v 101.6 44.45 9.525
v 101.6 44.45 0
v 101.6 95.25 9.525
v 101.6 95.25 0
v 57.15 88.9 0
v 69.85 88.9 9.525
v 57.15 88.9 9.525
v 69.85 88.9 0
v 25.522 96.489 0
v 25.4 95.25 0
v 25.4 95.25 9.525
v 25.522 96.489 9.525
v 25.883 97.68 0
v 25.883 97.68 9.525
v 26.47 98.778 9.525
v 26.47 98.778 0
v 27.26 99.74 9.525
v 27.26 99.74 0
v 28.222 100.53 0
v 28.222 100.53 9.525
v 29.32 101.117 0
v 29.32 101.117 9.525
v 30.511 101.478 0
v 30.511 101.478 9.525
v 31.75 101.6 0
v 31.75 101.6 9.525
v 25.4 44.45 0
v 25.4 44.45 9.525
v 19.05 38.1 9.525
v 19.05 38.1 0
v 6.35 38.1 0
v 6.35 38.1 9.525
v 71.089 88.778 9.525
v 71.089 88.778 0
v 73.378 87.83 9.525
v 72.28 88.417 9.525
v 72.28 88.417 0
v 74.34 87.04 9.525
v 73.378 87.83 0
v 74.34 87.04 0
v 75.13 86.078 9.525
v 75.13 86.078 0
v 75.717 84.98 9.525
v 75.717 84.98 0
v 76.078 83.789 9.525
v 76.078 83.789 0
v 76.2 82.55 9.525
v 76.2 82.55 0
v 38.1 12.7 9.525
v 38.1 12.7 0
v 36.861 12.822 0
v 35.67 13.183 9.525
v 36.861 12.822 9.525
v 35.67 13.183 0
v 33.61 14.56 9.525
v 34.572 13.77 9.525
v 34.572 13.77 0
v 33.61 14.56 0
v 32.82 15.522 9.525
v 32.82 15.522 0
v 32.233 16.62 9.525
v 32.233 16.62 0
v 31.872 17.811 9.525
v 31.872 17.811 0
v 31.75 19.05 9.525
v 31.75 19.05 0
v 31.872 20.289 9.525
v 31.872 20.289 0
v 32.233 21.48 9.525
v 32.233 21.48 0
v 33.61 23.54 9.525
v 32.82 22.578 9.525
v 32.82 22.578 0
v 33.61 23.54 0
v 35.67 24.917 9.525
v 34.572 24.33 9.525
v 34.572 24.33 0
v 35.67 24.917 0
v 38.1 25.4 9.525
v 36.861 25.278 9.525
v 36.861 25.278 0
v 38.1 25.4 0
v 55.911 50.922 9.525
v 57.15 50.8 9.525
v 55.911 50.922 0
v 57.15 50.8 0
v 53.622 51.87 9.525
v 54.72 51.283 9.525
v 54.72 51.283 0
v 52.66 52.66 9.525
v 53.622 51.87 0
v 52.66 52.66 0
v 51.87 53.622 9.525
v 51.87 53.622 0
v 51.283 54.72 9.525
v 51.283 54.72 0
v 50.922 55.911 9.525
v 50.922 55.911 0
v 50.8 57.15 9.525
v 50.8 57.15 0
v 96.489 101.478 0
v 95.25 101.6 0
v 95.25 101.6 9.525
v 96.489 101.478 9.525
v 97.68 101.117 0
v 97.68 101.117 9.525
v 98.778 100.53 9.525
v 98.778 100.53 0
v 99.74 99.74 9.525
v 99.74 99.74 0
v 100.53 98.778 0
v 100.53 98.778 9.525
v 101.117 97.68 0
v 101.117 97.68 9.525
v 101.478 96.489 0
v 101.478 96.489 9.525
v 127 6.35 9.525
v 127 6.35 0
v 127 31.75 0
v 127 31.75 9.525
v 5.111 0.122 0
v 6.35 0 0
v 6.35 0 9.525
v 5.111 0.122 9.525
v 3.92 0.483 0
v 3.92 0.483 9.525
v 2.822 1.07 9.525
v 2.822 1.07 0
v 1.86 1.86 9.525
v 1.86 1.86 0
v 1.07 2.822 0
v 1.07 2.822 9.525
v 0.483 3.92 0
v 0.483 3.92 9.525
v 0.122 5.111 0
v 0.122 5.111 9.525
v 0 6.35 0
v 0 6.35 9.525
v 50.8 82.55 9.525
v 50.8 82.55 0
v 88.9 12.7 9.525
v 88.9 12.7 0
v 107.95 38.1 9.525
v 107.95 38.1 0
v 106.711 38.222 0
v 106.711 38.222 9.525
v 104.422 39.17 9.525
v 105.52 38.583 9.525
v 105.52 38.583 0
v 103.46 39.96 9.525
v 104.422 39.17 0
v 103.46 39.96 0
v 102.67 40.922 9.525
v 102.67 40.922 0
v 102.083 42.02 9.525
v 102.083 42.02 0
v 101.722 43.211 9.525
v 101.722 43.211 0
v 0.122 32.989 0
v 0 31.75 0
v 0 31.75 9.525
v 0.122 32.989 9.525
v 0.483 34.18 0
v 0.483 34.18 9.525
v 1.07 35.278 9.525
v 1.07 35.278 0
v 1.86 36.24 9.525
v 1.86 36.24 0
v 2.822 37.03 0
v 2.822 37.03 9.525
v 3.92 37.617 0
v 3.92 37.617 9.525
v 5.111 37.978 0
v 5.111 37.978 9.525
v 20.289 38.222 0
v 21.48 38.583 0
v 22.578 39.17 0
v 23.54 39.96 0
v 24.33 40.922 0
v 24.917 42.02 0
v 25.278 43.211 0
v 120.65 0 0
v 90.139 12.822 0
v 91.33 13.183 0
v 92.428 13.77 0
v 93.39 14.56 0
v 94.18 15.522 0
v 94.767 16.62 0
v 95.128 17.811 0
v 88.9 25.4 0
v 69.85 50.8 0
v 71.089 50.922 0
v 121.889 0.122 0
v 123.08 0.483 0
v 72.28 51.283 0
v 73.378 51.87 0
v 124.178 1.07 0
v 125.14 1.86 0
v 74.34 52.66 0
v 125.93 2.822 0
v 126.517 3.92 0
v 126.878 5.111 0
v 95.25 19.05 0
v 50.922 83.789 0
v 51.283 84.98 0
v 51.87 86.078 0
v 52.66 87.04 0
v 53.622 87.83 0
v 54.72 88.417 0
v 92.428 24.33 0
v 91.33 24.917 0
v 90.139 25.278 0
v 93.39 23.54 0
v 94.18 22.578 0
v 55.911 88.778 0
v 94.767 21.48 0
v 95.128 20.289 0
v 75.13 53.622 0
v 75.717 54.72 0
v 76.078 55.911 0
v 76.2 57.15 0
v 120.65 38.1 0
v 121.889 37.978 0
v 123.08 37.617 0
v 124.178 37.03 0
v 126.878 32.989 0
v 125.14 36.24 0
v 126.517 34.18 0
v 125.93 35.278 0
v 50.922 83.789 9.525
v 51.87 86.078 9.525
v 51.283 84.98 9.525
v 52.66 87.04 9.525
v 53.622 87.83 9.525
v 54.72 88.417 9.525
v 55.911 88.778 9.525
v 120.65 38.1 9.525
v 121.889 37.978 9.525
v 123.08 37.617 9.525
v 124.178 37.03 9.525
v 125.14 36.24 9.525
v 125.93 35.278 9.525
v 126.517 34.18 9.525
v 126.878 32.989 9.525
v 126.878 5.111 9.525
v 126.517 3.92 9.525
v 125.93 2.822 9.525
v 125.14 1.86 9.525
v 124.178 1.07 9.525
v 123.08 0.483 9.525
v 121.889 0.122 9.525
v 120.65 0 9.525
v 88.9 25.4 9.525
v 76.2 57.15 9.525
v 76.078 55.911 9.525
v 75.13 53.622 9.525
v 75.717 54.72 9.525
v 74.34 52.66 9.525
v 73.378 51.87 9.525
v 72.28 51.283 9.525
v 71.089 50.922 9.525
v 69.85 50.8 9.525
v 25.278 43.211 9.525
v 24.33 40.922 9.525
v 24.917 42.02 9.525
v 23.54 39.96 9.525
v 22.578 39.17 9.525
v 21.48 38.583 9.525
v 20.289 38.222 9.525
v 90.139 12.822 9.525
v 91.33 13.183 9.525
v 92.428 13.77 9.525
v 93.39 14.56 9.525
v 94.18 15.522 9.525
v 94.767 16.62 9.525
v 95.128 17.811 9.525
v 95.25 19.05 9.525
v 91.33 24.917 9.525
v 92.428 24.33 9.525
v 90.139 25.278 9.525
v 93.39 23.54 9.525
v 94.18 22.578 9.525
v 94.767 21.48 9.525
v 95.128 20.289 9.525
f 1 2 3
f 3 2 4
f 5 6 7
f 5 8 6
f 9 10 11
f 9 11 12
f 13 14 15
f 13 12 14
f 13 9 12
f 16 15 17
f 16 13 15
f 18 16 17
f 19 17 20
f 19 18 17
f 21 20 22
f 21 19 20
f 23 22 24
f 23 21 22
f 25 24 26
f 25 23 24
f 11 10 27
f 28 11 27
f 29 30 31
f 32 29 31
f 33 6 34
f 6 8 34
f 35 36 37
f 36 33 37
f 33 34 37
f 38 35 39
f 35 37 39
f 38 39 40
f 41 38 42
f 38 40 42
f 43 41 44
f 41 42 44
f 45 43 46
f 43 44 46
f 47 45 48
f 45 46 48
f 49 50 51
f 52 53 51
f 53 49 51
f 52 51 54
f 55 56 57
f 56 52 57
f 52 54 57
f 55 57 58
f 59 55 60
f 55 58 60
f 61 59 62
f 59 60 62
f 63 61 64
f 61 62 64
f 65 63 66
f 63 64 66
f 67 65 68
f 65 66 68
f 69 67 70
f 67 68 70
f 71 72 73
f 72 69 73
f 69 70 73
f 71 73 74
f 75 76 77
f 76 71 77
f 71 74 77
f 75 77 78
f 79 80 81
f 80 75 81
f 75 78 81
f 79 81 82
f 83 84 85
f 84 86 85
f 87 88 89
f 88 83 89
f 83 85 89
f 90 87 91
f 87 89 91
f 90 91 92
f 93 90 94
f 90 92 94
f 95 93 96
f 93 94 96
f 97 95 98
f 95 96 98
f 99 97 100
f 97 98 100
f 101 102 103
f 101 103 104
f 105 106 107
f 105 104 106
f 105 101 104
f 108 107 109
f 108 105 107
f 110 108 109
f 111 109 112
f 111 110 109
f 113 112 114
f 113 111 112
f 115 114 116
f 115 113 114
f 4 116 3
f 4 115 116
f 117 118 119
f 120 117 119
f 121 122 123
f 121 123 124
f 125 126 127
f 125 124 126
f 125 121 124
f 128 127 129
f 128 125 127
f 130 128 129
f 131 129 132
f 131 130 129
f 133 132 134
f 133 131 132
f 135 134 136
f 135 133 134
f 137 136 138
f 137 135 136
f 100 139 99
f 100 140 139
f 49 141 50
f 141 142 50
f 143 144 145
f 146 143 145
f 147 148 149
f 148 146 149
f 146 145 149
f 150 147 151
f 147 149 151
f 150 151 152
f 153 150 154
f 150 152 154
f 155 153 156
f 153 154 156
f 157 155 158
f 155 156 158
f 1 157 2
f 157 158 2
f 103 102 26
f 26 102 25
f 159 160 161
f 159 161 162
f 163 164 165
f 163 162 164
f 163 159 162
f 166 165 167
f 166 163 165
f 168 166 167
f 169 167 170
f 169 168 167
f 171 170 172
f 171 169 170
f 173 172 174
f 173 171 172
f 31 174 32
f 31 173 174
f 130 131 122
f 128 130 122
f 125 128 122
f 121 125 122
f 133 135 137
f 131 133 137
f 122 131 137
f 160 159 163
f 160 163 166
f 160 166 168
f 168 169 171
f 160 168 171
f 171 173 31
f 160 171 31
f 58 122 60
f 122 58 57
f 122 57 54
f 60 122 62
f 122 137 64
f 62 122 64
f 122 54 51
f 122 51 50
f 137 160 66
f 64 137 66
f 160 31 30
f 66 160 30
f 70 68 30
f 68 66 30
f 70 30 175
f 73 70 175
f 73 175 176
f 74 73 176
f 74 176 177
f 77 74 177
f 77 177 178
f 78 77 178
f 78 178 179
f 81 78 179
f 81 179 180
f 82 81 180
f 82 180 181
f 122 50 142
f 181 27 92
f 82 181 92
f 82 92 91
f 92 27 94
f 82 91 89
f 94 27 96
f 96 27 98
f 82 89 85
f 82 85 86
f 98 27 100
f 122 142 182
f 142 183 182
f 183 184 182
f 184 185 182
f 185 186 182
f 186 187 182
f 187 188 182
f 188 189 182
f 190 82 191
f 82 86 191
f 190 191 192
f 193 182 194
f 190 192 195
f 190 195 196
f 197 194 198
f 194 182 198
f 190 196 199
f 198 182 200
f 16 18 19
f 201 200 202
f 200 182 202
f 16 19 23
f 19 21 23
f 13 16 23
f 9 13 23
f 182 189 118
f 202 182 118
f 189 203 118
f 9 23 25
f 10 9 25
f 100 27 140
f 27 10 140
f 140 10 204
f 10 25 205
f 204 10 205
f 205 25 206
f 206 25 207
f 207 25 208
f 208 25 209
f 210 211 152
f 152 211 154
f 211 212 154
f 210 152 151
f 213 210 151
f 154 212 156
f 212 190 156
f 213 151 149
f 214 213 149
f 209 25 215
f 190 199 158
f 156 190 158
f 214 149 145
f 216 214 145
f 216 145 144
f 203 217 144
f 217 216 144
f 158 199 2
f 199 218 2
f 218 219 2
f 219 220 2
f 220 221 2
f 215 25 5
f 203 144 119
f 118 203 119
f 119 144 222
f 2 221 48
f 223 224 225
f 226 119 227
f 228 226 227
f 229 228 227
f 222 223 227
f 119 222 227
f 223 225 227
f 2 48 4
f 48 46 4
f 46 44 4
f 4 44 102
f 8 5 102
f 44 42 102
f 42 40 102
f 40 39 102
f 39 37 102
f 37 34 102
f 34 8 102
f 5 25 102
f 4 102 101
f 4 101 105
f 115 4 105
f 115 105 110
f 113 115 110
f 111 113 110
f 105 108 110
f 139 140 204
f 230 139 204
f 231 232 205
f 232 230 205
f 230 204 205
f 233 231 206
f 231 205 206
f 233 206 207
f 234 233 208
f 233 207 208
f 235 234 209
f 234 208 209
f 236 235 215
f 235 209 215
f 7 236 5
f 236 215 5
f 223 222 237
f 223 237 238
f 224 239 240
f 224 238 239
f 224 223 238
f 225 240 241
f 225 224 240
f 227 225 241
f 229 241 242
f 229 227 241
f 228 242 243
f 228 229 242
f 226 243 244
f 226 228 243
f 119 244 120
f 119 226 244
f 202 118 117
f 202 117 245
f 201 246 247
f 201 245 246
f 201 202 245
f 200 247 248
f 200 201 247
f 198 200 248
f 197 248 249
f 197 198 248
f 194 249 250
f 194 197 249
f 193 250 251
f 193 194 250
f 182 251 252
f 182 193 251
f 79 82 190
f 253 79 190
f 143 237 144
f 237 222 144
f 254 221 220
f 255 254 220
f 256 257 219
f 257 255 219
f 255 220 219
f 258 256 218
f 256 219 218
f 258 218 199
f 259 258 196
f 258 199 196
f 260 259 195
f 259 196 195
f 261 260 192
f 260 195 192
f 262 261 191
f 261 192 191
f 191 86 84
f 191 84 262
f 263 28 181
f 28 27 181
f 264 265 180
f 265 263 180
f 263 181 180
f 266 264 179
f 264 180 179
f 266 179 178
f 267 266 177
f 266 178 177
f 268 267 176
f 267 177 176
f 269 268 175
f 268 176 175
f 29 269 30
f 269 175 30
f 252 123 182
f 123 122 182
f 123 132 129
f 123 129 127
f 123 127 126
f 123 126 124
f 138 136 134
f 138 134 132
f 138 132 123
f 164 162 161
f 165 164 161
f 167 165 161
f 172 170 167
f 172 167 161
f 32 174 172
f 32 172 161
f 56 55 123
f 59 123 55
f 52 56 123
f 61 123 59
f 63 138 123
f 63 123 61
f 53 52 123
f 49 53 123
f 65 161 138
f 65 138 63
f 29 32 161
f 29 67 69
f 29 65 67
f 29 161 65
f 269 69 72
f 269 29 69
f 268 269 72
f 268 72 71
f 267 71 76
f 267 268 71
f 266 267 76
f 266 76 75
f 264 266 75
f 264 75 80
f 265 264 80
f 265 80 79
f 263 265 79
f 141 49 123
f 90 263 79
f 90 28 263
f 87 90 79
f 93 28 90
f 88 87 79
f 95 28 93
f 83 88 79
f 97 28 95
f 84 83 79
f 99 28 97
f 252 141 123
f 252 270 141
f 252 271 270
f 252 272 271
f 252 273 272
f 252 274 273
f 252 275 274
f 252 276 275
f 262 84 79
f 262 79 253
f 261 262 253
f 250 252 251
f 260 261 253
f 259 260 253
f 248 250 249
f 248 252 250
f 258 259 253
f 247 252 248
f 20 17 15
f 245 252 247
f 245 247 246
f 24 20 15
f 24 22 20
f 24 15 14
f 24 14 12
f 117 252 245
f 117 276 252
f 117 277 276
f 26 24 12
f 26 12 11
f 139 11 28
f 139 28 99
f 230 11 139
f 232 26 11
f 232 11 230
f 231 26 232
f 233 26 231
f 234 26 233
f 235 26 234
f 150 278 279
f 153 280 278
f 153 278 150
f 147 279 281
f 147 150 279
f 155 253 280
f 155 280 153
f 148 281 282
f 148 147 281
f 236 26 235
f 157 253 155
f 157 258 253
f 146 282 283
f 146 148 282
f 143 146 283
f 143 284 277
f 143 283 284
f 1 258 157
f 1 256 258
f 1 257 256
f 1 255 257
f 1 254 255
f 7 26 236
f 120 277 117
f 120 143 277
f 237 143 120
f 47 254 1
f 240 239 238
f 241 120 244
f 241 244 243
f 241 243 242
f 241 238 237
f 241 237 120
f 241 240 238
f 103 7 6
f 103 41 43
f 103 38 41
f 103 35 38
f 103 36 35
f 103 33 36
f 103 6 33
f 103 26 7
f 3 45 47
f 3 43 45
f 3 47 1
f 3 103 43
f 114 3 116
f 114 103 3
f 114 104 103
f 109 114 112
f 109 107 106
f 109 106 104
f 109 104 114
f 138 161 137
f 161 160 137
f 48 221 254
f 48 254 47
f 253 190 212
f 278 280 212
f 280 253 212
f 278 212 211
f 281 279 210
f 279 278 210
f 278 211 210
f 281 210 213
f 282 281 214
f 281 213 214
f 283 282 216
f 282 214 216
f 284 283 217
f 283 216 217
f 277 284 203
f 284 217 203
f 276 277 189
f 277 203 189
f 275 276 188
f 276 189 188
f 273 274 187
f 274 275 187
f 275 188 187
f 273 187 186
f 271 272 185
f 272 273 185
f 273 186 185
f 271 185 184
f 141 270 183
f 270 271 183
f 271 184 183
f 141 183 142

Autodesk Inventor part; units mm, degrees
ref_plane "YZ Plane" through (0, 0, 0) normal (1, 0, 0) x (0, 1, 0)
ref_plane "XZ Plane" through (0, 0, 0) normal (0, 1, 0) x (-1, 0, 0)
ref_plane "XY Plane" through (0, 0, 0) normal (0, 0, 1) x (1, 0, 0)
sketch "Sketch1" plane through (0, 0, 0) normal (0, 0, 1) x (1, 0, 0)
  line L0 (6.35, 0) -> (120.65, 0)
  line L1 (127, 6.35) -> (127, 31.75)
  line L2 (120.65, 38.1) -> (107.95, 38.1)
  line L3 (101.6, 44.45) -> (101.6, 95.25)
  line L4 (95.25, 101.6) -> (31.75, 101.6)
  line L5 (25.4, 95.25) -> (25.4, 44.45)
  line L6 (19.05, 38.1) -> (6.35, 38.1)
  line L7 (0, 31.75) -> (0, 6.35)
  arc A0 (31.75, 101.6) -> (25.4, 95.25) centre (31.75, 95.25) ccw
  arc A1 (19.05, 38.1) -> (25.4, 44.45) centre (19.05, 44.45) ccw
  arc A2 (6.35, 38.1) -> (0, 31.75) centre (6.35, 31.75) ccw
  arc A3 (0, 6.35) -> (6.35, 0) centre (6.35, 6.35) ccw
  arc A4 (120.65, 0) -> (127, 6.35) centre (120.65, 6.35) ccw
  arc A5 (127, 31.75) -> (120.65, 38.1) centre (120.65, 31.75) ccw
  arc A6 (101.6, 44.45) -> (107.95, 38.1) centre (107.95, 44.45) ccw
  arc A7 (101.6, 95.25) -> (95.25, 101.6) centre (95.25, 95.25) ccw
  line L8 (57.15, 50.8) -> (69.85, 50.8)
  line L9 (76.2, 57.15) -> (76.2, 82.55)
  line L10 (69.85, 88.9) -> (57.15, 88.9)
  line L11 (50.8, 82.55) -> (50.8, 57.15)
  arc A8 (38.1, 25.4) -> (38.1, 12.7) centre (38.1, 19.05) ccw
  arc A9 (88.9, 12.7) -> (88.9, 25.4) centre (88.9, 19.05) ccw
  line L12 (38.1, 25.4) -> (88.9, 25.4)
  line L13 (88.9, 12.7) -> (38.1, 12.7)
  arc A10 (57.15, 88.9) -> (50.8, 82.55) centre (57.15, 82.55) ccw
  arc A11 (50.8, 57.15) -> (57.15, 50.8) centre (57.15, 57.15) ccw
  arc A12 (69.85, 50.8) -> (76.2, 57.15) centre (69.85, 57.15) ccw
  arc A13 (76.2, 82.55) -> (69.85, 88.9) centre (69.85, 82.55) ccw
  point P0 (0, 0)
  point P1 (127, 0)
  point P2 (127, 38.1)
  point P3 (101.6, 38.1)
  point P4 (25.4, 38.1)
  point P5 (0, 38.1)
  dimension "d0" = 127
  dimension "d1" = 38.1
  dimension "d2" = 25.4
  dimension "d3" = 6.35
  dimension "d4" = 6.35
extrude "Extrusion1" add sketch "Sketch1" along normal blind 9.525
properties part number "P2-7"
